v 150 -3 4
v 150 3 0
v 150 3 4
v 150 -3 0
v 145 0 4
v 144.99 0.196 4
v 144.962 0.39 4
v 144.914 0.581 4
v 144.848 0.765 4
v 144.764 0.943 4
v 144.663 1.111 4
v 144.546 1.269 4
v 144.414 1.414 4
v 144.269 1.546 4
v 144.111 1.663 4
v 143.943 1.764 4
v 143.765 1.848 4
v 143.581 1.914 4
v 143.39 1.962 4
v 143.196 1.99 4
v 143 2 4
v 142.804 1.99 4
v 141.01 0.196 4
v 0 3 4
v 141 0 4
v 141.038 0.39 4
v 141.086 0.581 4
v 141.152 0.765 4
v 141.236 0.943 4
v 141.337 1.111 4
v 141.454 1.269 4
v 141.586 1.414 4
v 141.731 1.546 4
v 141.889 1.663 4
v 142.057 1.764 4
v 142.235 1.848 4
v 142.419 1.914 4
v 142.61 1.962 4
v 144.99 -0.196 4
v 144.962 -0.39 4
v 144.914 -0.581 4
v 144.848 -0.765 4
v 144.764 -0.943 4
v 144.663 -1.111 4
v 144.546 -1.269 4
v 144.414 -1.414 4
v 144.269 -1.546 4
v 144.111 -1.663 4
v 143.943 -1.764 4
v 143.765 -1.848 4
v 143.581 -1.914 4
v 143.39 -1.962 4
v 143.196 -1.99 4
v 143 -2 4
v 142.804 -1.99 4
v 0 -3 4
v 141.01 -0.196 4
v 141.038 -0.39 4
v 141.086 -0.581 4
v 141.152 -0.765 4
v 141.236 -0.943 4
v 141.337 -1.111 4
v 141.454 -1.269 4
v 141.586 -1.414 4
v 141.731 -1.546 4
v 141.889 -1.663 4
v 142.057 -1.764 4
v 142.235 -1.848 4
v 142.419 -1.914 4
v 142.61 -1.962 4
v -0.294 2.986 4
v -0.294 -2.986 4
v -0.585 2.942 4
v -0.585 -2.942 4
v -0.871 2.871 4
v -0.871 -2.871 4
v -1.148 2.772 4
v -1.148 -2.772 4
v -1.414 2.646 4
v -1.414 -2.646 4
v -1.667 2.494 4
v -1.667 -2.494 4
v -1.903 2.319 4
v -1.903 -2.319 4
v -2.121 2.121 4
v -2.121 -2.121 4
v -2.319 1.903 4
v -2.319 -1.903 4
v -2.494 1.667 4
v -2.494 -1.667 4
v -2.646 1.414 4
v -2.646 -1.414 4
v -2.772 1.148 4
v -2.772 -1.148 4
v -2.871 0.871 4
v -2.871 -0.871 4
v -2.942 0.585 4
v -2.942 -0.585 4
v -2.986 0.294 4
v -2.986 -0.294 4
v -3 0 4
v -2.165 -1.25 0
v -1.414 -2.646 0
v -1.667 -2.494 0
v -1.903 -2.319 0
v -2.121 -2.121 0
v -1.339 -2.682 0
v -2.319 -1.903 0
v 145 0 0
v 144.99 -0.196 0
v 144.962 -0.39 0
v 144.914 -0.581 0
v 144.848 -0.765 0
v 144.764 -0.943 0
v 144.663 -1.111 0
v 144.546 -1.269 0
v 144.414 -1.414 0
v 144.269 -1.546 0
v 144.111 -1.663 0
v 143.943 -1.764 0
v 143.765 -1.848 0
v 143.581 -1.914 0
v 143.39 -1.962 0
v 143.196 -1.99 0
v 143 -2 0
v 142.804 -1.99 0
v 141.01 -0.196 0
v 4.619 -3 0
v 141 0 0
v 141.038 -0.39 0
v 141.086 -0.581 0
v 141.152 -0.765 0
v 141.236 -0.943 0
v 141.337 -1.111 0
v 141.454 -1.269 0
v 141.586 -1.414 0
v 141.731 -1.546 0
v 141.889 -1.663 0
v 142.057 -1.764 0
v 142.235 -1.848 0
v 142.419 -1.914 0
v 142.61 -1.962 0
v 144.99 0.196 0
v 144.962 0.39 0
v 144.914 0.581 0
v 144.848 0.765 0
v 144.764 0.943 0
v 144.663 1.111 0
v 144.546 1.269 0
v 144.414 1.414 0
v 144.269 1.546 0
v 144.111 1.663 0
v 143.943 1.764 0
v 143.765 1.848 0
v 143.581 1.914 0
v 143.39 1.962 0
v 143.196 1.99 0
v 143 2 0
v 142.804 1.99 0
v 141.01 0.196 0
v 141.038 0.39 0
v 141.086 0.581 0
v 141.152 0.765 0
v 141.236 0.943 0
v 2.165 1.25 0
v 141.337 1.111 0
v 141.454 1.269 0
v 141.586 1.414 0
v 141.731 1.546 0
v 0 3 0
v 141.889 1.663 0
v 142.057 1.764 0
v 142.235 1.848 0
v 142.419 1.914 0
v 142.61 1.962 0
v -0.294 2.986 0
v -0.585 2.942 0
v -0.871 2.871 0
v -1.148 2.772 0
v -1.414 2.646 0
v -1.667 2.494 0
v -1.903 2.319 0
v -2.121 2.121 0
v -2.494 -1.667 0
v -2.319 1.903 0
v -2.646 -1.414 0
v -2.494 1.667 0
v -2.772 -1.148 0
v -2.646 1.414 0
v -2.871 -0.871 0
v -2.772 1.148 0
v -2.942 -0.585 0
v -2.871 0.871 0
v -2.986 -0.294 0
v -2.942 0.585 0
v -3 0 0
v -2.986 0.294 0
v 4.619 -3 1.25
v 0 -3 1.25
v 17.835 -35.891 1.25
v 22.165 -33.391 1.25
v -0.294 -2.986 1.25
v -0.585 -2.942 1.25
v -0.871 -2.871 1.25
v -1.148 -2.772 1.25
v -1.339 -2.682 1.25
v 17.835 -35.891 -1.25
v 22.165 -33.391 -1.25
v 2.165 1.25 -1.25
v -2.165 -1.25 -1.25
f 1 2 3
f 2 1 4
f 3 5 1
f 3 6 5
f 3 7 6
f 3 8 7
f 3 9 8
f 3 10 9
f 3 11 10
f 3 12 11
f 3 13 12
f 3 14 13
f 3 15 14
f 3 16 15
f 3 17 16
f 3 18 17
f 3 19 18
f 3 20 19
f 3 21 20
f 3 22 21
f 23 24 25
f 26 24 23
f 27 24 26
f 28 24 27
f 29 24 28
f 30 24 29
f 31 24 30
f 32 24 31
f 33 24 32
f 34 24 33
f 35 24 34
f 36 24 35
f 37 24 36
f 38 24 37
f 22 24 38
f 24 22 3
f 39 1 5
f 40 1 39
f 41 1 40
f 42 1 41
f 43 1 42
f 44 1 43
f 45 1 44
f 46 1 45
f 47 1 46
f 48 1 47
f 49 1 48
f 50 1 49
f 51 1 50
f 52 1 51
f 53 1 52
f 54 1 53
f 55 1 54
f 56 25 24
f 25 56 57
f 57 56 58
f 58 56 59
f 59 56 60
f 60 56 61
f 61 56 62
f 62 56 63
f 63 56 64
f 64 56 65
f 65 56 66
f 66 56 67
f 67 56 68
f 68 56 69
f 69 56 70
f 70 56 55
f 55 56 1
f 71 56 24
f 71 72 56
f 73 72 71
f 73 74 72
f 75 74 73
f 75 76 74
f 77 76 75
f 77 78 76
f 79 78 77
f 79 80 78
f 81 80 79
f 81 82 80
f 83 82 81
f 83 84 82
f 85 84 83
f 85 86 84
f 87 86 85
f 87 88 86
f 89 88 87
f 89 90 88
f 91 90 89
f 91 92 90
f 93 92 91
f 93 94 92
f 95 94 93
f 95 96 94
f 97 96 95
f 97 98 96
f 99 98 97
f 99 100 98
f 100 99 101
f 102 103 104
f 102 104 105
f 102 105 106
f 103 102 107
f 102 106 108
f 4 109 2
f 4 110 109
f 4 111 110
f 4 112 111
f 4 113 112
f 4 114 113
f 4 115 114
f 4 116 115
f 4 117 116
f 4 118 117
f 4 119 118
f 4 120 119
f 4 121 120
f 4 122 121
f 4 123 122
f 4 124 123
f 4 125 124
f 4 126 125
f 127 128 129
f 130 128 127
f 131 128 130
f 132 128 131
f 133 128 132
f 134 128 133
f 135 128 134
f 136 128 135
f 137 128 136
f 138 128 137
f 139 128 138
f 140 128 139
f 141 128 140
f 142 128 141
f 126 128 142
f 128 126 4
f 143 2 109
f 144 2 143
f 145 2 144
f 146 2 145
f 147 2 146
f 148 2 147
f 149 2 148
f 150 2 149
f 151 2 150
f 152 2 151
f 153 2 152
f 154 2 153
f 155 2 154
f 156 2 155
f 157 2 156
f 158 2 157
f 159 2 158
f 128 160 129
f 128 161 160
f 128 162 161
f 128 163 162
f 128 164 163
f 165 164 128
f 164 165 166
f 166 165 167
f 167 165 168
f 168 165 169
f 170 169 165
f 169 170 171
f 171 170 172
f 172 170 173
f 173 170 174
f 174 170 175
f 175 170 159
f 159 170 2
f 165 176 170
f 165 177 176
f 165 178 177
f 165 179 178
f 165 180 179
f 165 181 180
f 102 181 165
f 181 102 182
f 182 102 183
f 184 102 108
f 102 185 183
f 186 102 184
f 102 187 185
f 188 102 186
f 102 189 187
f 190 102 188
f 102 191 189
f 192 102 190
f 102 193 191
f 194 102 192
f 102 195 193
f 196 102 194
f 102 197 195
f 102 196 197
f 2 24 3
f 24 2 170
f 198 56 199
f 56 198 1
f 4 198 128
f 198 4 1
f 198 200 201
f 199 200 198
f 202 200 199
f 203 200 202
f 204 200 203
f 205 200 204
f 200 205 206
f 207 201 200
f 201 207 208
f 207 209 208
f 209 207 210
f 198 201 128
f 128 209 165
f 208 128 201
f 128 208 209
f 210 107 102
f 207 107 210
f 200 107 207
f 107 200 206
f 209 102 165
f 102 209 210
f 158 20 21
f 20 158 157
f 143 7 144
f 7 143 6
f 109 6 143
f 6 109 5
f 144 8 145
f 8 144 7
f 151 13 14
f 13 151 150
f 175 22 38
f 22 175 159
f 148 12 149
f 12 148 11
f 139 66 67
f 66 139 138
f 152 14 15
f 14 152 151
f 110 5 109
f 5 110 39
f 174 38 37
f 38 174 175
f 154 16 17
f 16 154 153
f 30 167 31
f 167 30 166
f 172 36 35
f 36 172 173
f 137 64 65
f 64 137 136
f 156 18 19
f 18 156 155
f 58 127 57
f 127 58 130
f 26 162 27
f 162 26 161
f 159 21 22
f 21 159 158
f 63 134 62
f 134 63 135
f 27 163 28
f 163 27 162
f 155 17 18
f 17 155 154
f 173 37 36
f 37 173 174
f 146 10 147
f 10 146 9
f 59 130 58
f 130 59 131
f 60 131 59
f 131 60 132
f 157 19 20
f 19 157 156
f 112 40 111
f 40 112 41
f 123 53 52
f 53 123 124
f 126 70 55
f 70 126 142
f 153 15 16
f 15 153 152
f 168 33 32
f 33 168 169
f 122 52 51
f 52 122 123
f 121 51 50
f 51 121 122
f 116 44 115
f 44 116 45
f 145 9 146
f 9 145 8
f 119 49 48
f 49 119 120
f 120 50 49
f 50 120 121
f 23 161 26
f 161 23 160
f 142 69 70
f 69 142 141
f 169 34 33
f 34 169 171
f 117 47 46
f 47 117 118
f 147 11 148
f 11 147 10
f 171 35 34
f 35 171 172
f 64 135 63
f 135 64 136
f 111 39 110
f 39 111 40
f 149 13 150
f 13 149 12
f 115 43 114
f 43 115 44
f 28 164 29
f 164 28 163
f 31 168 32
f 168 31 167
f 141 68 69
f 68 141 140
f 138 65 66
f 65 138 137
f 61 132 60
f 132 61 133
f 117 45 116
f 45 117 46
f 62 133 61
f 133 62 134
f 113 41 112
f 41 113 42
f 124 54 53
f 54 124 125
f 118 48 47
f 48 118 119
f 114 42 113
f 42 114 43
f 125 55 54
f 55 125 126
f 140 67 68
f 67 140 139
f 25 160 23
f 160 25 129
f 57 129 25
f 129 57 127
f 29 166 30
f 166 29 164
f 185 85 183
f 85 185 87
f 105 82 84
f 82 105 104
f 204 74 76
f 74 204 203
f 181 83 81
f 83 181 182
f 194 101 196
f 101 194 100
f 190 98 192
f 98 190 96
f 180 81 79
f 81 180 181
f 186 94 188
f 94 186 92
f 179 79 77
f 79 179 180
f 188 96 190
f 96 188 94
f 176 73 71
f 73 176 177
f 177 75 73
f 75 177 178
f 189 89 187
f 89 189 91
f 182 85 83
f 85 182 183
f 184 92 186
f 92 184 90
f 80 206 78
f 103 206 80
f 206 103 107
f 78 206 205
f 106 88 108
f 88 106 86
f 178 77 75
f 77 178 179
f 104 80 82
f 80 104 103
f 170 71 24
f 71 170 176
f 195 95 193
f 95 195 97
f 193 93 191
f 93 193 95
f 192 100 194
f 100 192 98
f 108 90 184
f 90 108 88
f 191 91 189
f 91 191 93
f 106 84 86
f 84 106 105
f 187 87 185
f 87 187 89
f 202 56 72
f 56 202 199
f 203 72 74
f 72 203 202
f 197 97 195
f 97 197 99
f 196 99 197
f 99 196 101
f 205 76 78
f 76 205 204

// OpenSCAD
// L-shaped (hockey-stick) cell spreader for plating bacteria

// --- Dimensions ---

// Handle dimensions
handle_length = 150;    // Length of the main bar (X direction)
handle_width = 6;       // Width of the handle
handle_thickness = 4;   // Thickness of the handle
handle_x_start = 0;     // X start for handle placement
handle_y_min = -3;      // Y min for handle placement
handle_y_max = 3;       // Y max for handle placement

// Spreading foot dimensions
foot_length = 40;       // Length of the spreading foot
foot_width = 5;         // Width of the spreading foot
foot_thickness = 2.5;   // Thickness of the spreading foot
angle_degrees = 120;    // Angle between handle and foot (counter-clockwise from +X)

// Boss dimensions
boss_diameter = 6;      // Diameter of the central boss
boss_height = 4;        // Height of the central boss

// Hole dimensions
hole_diameter = 4;      // Diameter of the hanging hole
hole_x_position = 143;  // X position where the hole is cut in the handle

// --- Constants ---
$fn = 64;

// --- Geometry Construction ---

module handle() {
    cube([handle_length, handle_width, handle_thickness], center = false);
}

module foot() {
    // Calculate rotation matrix for the foot placement
    angle_rad = angle_degrees * (PI / 180);
    
    // The foot's centerline starts at the origin and points 120 degrees CCW from +X.
    // We define the foot centered around its own local axes, then rotate it.
    translate([foot_length/2, 0, foot_thickness/2]) {
        rotate([0, 0, angle_degrees]) {
            cube([foot_length, foot_width, foot_thickness], center = true);
        }
    }
}

module boss() {
    cylinder(h = boss_height, r = boss_diameter / 2, center = true);
}

module handle_hole() {
    // Cut a hole through the handle at x=143, y=0.
    translate([hole_x_position, 0, -1]) { // Extend slightly below Z=0 for clean cut
        cylinder(h = handle_thickness + 2, r = hole_diameter / 2);
    }
}

// --- Assembly ---

difference() {
    // 1. Base structure (Handle and Foot)
    union() {
        // Handle: Centered at origin for simplicity of placement relative to the boss/foot junction
        translate([handle_x_start, -handle_width/2, 0]) {
            handle();
        }

        // Foot: Rotated around the origin (where it meets the handle)
        // We need to translate the foot so its center aligns with the origin after rotation.
        // Since we defined the foot module centered on its own local axes, and we want one end at the origin, 
        // we place it such that its geometric center is offset by half its length along the rotated axis.
        translate([0, 0, 0]) { // Start placement at origin
            rotate([0, 0, angle_degrees]) {
                // The foot needs to be positioned so one end (the junction) is at the origin.
                // Since we defined it centered on its own axes, we shift it back by half its length along the rotated axis.
                translate([-foot_length/2, 0, 0]) {
                    cube([foot_length, foot_width, foot_thickness], center = true);
                }
            }
        }
    }

    // 2. Subtractions (Hole and Boss removal)
    union() {
        // A. Hole in the handle
        handle_hole();

        // B. Cut out space for the boss to ensure clean union at the junction, though the boss is added later.
        // We don't strictly need this if we just add the boss on top of the union, but it ensures the base material is continuous.
    }
}

// 3. Boss addition (Placed on top of the structure)
translate([0, 0, boss_height / 2]) {
    boss();
}
